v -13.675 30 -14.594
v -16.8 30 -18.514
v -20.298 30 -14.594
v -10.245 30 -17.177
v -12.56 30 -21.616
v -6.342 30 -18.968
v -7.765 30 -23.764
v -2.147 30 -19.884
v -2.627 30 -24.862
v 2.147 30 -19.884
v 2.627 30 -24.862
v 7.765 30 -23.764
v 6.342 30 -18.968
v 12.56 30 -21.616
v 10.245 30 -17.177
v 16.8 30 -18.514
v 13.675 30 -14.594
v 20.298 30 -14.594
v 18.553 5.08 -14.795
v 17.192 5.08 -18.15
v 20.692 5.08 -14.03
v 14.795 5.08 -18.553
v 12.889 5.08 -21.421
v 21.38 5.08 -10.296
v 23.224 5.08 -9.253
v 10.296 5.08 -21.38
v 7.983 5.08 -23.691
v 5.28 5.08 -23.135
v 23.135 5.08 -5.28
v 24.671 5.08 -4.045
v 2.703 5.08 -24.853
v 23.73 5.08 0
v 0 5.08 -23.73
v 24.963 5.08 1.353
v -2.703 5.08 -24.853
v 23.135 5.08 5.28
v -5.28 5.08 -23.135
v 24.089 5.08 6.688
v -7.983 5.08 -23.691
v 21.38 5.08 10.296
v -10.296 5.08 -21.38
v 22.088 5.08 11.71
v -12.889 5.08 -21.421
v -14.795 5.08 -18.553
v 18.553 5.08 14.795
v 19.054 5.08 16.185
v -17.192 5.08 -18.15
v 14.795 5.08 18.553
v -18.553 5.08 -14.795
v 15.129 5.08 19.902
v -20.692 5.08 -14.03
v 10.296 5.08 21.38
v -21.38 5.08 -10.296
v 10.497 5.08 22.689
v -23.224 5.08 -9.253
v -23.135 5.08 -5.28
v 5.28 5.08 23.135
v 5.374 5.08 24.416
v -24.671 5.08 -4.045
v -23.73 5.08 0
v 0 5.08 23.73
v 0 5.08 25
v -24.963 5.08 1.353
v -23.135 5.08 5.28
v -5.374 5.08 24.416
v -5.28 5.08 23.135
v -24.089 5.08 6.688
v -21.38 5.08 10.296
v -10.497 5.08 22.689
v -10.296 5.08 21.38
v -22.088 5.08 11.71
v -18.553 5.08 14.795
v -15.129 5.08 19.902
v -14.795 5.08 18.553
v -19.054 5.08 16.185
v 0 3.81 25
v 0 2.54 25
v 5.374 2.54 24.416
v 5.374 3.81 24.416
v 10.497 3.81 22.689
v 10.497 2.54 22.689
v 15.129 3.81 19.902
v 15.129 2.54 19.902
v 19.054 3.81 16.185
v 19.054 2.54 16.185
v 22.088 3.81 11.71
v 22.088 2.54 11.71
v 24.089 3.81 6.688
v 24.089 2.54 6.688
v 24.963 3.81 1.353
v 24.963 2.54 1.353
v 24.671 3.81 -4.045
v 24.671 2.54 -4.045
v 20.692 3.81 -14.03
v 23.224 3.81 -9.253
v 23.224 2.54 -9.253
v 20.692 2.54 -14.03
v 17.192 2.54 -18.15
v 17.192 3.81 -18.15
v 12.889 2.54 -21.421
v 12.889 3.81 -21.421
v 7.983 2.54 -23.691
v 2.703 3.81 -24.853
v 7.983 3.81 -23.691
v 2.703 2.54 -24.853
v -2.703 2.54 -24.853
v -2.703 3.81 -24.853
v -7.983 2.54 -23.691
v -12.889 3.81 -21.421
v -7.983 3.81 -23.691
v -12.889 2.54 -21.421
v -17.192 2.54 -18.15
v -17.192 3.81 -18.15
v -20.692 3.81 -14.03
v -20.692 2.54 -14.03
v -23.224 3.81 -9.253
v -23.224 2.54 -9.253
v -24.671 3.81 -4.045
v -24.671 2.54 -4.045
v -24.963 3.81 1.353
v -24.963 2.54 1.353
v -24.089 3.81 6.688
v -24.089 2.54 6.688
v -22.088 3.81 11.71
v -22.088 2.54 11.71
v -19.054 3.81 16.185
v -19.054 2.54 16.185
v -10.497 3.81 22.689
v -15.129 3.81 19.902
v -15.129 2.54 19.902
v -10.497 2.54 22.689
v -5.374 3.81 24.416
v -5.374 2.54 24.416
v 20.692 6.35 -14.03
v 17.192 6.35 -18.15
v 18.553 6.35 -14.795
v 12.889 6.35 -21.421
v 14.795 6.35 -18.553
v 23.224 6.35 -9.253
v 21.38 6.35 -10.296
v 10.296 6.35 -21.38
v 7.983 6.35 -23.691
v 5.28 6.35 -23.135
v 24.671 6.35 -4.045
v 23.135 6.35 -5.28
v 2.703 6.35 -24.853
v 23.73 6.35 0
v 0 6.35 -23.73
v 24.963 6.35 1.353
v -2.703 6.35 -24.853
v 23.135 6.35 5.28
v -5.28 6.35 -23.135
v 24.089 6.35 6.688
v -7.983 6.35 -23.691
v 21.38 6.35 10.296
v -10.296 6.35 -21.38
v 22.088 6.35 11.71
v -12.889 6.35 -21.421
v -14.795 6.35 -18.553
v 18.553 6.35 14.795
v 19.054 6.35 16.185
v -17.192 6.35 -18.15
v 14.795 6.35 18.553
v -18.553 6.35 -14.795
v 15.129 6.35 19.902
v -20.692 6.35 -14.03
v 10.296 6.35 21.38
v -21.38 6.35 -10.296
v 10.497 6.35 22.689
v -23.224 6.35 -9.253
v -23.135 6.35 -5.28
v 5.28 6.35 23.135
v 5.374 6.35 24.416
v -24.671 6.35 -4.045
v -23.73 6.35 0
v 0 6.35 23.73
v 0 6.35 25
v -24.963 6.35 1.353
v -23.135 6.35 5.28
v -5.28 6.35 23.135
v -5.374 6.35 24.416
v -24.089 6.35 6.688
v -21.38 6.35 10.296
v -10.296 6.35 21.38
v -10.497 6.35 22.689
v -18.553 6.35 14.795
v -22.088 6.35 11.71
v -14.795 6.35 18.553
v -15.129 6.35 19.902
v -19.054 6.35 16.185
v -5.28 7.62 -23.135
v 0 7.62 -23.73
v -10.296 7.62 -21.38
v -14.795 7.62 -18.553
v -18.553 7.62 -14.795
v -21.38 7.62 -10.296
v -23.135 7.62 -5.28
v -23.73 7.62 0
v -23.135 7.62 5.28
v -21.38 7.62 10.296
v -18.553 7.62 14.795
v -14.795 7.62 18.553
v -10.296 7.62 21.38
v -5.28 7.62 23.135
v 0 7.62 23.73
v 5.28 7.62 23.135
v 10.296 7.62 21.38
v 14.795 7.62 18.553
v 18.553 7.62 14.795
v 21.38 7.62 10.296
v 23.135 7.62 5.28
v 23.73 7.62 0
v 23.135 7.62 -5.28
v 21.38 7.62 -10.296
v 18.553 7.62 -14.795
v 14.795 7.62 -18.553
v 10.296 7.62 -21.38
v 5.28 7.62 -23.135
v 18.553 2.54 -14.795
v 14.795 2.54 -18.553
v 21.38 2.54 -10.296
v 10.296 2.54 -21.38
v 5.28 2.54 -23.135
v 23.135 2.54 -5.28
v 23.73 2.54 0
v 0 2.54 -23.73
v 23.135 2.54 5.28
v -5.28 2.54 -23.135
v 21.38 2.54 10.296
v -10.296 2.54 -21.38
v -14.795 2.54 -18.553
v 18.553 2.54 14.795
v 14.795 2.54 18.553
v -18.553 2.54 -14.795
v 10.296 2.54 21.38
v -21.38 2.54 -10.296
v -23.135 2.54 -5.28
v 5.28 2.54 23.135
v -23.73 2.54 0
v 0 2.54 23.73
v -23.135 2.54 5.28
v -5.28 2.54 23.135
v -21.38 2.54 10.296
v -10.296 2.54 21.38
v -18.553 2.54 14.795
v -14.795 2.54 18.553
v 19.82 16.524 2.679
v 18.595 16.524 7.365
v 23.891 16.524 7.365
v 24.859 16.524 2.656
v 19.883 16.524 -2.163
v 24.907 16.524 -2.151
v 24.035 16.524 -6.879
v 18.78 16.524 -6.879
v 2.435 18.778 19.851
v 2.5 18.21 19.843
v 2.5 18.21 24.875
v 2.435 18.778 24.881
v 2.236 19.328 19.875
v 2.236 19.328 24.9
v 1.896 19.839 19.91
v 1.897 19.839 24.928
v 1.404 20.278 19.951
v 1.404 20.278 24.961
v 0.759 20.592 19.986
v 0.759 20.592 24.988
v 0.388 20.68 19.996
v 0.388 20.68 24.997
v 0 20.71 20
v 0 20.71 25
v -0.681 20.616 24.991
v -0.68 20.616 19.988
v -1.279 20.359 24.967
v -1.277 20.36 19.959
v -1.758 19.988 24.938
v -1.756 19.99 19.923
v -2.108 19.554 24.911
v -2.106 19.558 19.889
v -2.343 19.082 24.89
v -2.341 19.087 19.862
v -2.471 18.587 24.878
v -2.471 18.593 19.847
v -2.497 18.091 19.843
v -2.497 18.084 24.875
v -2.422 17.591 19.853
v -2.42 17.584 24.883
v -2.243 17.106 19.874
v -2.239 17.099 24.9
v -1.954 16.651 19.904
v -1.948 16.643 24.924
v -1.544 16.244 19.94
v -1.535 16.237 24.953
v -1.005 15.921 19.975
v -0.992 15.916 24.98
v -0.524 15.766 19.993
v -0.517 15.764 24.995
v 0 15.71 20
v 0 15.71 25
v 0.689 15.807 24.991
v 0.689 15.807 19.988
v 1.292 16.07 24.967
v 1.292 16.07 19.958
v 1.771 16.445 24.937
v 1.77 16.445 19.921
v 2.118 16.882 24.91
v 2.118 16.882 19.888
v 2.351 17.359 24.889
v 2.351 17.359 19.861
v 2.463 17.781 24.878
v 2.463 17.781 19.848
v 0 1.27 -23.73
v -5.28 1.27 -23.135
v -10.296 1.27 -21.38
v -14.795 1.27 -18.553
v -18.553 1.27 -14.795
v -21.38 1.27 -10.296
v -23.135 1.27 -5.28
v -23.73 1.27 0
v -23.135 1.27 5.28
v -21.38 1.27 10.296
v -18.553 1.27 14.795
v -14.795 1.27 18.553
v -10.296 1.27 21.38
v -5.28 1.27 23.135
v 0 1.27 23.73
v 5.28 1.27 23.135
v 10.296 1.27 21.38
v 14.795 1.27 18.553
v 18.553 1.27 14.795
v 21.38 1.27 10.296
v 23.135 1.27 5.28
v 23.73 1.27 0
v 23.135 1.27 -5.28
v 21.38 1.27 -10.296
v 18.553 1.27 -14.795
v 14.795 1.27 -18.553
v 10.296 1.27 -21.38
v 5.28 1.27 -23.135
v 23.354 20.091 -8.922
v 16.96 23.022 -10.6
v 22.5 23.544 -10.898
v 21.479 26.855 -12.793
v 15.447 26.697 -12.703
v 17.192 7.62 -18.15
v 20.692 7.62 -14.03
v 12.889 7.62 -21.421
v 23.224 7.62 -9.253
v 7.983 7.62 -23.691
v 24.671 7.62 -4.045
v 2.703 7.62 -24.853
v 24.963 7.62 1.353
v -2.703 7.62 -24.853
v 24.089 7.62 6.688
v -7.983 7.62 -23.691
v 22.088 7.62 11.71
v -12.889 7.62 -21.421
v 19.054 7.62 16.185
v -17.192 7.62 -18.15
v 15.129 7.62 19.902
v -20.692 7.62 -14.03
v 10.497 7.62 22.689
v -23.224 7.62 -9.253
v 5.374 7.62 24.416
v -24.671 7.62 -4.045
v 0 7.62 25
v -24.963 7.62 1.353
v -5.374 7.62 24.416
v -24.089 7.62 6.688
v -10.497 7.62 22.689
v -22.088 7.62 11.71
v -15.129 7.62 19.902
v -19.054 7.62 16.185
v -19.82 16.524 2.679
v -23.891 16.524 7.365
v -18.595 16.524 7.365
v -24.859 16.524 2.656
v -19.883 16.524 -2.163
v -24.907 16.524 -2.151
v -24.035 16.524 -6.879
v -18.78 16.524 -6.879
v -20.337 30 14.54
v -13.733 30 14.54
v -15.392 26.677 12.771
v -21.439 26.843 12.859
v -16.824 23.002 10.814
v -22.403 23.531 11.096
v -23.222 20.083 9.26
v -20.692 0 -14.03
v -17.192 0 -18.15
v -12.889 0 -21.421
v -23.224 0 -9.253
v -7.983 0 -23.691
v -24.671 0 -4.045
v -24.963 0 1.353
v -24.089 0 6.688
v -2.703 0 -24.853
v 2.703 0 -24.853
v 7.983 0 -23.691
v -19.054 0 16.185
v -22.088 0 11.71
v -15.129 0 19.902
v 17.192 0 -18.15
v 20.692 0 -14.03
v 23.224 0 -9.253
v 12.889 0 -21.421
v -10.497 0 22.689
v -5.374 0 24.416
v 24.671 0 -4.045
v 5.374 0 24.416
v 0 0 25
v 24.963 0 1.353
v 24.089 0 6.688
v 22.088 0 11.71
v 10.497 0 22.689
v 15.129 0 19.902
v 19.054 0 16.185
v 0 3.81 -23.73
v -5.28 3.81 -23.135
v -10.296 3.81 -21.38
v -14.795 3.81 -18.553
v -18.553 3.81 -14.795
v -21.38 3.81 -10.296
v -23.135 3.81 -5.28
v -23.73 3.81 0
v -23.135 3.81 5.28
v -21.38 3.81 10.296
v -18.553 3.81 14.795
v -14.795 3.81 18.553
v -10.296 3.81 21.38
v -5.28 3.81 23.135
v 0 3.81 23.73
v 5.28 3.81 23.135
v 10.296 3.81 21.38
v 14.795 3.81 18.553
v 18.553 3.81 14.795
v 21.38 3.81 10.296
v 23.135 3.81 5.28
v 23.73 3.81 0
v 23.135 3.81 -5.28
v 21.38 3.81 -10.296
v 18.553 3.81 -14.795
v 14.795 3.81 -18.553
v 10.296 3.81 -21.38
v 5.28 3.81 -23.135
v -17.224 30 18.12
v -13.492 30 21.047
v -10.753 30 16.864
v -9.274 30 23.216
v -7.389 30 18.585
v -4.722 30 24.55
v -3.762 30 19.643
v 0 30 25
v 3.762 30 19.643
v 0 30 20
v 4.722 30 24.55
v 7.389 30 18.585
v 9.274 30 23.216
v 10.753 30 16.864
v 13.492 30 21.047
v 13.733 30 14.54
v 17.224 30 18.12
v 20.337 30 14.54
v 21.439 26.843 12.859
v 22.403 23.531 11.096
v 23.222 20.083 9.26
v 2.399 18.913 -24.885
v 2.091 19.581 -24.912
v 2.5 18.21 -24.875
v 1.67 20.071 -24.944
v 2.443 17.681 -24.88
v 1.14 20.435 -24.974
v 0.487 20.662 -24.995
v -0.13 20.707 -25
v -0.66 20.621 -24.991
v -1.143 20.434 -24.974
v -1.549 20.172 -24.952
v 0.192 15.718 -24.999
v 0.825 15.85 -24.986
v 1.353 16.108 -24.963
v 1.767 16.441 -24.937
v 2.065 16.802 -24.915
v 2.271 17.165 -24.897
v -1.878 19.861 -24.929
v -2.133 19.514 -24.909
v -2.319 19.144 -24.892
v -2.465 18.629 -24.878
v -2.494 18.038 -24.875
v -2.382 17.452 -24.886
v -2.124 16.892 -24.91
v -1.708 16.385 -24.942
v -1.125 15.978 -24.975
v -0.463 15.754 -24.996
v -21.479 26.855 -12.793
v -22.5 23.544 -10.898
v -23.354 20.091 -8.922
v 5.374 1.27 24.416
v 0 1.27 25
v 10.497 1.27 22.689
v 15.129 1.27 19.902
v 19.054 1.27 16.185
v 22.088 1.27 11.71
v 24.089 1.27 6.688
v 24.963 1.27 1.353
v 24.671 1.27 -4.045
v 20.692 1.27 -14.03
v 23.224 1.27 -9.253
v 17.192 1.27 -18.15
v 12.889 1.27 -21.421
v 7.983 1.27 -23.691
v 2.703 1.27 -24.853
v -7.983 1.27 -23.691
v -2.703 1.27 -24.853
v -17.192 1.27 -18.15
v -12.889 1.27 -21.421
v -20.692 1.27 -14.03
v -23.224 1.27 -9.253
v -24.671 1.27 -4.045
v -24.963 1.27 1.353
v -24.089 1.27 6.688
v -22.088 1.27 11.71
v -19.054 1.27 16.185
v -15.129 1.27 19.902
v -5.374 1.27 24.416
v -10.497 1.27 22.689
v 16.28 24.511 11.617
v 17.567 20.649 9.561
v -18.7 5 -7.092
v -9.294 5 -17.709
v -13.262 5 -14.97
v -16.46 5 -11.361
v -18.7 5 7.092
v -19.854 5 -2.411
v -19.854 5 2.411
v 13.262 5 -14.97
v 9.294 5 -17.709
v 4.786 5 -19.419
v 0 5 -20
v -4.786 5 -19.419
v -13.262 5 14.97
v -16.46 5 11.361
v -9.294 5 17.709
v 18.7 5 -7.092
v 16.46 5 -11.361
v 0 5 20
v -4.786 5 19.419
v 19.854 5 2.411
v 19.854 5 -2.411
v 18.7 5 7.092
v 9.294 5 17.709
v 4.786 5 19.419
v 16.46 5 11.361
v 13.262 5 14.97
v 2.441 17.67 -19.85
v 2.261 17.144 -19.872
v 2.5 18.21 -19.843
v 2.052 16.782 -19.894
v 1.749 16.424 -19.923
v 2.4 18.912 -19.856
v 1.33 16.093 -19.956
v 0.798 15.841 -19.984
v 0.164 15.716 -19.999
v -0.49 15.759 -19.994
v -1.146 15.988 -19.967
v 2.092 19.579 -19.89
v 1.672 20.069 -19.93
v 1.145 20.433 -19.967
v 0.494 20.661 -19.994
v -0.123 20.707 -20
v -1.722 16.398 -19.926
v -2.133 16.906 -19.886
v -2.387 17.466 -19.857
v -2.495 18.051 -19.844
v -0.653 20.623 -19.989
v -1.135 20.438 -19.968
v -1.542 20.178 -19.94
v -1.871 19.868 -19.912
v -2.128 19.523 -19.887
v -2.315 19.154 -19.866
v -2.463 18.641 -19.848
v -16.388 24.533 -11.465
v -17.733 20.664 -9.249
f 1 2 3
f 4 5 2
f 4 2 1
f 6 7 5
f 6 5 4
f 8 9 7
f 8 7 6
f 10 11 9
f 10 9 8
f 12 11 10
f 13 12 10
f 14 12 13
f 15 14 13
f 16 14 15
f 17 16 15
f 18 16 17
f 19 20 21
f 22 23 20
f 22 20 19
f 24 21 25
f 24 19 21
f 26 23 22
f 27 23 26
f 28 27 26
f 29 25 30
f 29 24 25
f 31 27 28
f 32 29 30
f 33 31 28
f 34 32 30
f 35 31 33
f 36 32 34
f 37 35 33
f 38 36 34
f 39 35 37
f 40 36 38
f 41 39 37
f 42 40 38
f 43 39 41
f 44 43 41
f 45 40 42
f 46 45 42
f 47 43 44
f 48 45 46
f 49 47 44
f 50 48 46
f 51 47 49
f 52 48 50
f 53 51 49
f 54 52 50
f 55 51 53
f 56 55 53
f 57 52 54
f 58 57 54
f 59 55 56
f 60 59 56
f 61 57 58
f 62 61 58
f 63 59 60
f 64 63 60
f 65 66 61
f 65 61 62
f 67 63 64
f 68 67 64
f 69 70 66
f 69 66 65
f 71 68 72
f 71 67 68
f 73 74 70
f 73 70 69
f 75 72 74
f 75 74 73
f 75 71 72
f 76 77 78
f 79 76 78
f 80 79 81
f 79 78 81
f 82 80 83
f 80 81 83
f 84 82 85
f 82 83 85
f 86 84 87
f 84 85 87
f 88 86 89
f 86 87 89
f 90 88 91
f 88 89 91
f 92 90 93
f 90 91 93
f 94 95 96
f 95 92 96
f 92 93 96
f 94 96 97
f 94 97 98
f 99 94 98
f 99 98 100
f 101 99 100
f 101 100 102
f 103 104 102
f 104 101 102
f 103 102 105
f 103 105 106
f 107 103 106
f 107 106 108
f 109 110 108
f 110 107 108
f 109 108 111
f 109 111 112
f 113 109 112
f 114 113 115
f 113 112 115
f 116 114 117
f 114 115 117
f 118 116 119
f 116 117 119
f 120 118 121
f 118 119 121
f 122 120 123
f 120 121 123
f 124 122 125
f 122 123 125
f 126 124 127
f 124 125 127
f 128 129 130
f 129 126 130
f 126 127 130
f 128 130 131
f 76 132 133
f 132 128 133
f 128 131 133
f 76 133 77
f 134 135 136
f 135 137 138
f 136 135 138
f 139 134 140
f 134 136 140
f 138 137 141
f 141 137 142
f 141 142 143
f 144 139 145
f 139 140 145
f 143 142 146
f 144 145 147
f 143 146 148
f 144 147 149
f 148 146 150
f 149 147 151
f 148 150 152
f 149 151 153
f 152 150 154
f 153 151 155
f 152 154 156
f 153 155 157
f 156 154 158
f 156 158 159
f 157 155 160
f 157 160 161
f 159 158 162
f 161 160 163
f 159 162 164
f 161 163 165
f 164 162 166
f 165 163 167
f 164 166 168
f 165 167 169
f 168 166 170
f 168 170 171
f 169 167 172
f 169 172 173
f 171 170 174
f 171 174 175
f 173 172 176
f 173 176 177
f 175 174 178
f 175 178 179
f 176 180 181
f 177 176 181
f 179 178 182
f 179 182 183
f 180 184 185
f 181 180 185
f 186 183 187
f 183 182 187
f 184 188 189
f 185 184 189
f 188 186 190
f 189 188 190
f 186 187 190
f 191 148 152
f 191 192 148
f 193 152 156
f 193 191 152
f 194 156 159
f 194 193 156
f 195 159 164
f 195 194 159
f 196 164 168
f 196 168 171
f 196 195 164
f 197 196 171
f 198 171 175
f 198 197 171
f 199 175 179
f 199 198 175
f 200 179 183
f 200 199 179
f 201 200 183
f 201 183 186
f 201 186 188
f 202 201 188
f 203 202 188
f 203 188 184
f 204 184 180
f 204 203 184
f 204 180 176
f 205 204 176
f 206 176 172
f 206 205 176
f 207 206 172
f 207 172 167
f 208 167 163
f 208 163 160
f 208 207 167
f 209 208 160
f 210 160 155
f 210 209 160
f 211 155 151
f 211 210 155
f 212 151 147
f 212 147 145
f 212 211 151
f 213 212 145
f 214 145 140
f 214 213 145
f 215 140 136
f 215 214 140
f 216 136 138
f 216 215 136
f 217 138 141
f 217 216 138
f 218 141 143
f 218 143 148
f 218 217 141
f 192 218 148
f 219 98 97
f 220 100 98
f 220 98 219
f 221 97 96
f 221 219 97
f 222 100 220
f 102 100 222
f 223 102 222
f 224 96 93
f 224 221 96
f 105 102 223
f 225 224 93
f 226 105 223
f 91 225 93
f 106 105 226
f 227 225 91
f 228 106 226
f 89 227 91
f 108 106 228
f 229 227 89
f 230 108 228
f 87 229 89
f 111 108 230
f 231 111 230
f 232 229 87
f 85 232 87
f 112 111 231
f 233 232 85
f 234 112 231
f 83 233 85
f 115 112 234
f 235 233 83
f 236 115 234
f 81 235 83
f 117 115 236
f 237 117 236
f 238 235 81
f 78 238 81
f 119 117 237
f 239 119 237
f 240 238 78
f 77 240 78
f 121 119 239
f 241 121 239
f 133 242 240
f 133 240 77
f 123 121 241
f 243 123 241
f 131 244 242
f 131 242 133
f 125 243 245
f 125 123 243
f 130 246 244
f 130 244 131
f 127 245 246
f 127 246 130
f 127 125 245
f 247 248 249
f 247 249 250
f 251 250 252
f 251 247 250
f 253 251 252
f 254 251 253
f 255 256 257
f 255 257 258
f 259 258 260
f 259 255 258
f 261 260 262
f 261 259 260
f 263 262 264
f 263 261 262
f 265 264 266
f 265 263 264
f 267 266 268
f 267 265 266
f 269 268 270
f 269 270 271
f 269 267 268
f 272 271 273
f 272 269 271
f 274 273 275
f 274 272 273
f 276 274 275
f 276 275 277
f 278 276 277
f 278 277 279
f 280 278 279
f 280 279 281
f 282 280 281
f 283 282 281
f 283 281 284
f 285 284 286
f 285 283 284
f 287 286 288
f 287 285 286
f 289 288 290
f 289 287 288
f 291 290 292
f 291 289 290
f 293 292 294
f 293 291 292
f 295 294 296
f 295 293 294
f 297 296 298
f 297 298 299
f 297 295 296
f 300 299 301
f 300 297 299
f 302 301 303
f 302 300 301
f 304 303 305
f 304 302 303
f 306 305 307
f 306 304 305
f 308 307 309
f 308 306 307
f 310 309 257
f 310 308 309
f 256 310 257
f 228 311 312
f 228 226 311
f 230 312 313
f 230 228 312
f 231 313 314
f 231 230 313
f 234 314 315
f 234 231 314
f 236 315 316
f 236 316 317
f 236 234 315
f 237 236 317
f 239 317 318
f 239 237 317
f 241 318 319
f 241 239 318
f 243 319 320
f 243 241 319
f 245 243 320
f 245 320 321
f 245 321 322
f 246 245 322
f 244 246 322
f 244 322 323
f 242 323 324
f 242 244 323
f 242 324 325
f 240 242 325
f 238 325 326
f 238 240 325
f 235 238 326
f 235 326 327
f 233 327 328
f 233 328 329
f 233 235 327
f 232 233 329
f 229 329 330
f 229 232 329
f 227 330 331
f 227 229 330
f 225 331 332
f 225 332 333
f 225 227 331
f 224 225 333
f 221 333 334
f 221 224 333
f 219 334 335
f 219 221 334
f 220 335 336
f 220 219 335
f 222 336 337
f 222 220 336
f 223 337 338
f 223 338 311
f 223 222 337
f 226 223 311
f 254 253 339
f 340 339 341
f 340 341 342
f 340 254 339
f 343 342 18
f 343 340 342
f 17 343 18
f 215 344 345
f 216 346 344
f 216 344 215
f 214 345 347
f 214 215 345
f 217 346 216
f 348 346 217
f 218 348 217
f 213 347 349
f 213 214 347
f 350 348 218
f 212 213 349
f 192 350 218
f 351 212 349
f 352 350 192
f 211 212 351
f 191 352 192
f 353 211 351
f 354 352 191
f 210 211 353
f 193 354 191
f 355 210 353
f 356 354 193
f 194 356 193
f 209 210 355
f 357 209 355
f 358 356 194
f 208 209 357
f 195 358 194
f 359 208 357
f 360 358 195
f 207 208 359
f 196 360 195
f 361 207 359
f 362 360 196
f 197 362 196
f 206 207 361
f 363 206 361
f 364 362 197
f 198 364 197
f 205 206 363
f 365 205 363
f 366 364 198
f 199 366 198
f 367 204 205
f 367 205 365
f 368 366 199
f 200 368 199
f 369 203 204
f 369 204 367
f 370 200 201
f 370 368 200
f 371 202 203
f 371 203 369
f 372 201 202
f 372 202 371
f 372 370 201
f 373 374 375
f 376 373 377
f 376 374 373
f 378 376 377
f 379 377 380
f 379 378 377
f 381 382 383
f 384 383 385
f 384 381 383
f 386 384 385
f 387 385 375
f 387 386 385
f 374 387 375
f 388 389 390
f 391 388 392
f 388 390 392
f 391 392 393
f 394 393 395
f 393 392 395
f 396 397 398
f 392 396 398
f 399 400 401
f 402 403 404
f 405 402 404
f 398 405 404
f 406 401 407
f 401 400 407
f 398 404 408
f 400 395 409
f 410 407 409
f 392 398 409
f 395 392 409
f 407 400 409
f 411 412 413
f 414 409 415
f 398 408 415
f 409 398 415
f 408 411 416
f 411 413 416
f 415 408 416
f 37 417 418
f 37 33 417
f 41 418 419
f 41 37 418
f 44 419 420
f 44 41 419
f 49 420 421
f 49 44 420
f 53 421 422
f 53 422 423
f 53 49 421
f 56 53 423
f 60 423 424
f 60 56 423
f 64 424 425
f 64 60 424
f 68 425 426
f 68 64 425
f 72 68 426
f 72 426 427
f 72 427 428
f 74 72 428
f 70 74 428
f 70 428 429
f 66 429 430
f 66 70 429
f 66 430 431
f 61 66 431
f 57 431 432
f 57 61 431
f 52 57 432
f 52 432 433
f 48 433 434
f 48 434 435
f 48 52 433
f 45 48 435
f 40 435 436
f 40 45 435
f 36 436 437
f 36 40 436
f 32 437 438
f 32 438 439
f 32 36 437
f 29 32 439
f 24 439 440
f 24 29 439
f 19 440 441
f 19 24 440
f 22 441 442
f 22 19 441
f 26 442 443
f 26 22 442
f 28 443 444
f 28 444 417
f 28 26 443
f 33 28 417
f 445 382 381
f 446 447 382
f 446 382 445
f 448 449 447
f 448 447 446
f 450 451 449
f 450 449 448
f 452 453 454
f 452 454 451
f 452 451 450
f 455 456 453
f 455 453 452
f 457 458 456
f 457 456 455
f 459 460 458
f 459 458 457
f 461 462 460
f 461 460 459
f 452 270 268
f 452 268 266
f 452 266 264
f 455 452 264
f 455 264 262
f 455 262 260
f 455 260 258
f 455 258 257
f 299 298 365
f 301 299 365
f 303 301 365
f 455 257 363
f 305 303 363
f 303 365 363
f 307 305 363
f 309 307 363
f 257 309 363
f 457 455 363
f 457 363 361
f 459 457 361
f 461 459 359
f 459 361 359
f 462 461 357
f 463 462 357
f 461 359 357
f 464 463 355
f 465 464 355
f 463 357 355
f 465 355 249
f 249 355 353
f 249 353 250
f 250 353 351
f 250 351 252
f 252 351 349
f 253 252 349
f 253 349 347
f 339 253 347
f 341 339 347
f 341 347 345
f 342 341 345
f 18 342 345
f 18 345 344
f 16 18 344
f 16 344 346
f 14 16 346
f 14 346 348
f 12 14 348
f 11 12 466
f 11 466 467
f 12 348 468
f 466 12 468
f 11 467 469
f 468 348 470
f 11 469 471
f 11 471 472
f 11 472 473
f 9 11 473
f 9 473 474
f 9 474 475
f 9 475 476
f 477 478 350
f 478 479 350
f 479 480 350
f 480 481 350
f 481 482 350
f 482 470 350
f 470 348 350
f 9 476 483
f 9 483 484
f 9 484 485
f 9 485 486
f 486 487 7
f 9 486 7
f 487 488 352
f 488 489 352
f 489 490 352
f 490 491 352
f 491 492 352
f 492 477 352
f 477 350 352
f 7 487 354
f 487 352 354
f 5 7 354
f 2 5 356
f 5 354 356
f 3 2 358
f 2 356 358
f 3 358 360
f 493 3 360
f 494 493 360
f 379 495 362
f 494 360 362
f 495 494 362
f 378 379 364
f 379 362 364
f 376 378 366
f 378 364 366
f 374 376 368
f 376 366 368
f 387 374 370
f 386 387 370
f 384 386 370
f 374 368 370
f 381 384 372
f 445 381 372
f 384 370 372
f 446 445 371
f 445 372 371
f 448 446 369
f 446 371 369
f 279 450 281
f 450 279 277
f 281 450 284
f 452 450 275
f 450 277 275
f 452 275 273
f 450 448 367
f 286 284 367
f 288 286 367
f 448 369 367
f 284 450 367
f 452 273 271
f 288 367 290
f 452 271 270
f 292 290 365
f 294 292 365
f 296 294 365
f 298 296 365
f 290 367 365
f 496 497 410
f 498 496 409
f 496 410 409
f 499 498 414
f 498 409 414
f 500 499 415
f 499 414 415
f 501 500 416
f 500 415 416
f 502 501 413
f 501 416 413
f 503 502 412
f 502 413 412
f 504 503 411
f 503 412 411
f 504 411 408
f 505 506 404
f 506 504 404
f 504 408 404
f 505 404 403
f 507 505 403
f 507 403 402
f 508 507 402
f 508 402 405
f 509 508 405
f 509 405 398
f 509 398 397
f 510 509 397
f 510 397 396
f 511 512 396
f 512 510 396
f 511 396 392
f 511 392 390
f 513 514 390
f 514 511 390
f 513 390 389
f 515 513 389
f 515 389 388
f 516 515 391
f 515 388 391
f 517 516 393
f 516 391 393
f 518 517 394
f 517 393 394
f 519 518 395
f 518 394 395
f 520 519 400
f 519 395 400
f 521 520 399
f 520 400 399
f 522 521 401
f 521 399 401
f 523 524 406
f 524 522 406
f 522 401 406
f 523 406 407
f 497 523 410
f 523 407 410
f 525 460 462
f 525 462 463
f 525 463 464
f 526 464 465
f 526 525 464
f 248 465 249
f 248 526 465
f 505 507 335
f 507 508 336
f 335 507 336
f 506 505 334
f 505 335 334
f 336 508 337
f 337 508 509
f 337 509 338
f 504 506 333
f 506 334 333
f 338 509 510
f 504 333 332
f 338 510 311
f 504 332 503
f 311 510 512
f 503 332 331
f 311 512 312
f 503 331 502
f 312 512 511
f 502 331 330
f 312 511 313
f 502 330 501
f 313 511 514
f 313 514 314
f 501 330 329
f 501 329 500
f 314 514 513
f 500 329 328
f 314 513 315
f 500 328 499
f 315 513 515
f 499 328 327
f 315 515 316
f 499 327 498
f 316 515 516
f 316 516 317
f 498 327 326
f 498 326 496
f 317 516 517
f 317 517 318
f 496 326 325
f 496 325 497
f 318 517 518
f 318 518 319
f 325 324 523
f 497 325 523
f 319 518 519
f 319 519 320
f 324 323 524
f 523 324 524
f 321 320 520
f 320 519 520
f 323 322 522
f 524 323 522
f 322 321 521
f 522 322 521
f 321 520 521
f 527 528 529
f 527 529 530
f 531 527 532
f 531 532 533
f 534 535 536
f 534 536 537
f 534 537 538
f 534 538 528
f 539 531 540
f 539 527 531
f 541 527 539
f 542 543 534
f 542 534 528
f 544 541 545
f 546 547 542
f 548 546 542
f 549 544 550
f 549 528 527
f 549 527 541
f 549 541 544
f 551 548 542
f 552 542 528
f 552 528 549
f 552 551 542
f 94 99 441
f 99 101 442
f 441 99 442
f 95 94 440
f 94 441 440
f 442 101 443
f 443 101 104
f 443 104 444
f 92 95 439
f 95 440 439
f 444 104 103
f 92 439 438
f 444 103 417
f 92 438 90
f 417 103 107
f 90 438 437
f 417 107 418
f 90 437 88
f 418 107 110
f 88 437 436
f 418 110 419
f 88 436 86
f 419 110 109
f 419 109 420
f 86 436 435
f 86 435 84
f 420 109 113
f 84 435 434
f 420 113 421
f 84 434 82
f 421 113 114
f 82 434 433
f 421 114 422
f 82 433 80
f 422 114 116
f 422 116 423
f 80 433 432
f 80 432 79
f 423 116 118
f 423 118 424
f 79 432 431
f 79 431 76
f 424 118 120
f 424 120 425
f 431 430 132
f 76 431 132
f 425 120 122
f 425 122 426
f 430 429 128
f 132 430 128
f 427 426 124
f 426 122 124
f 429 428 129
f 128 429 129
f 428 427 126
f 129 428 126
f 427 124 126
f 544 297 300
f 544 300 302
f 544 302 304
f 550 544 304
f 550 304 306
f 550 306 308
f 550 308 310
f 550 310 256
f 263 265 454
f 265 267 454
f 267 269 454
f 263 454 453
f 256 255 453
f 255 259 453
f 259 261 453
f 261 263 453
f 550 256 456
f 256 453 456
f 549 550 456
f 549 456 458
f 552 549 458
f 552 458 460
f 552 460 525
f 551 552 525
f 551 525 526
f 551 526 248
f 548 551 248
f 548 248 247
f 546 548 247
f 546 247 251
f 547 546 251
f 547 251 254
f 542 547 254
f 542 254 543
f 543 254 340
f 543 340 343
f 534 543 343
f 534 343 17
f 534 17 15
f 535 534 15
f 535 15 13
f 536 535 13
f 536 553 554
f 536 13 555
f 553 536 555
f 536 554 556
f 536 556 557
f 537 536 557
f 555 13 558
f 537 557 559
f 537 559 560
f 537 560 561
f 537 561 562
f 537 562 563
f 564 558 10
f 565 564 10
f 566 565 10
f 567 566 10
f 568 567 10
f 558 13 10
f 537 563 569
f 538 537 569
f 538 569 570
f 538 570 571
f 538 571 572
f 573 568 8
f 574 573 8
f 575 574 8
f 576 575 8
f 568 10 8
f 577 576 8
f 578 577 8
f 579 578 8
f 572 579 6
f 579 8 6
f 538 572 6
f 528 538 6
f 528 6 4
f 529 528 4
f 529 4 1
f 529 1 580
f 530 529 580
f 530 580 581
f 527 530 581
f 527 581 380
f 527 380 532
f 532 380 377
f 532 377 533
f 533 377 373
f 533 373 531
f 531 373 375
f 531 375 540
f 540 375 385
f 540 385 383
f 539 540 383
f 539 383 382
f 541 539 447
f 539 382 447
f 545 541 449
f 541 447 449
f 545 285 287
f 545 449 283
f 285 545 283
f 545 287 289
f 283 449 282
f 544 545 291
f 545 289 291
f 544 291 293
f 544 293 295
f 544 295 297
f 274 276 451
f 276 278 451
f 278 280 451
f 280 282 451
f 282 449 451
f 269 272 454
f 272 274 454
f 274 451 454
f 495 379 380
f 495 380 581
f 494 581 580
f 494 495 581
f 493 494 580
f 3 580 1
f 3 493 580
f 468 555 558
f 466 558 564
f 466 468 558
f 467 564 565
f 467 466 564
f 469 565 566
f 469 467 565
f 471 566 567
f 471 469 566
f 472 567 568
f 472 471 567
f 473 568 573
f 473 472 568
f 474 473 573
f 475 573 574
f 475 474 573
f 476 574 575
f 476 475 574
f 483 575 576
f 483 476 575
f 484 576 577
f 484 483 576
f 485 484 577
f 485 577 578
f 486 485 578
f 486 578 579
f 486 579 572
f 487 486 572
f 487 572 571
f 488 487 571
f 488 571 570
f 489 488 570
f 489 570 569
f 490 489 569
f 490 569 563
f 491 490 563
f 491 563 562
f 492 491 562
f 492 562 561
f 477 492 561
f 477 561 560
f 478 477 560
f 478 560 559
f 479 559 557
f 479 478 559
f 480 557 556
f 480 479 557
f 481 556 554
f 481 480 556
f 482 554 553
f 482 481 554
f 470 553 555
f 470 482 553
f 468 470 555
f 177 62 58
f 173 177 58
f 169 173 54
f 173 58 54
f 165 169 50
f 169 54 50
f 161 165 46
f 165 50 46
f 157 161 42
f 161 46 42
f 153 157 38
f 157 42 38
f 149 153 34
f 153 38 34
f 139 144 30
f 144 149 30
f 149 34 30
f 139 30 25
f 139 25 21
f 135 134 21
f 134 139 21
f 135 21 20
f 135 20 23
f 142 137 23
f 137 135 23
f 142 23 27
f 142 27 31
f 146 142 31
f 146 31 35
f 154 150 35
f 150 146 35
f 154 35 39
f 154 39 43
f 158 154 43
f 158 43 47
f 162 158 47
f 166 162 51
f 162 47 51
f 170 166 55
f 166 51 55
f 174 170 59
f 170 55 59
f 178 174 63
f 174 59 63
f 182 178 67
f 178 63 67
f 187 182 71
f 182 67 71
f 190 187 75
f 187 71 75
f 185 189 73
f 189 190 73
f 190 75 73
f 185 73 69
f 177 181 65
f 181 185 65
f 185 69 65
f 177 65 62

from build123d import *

# Parameters (mm, degrees)
SKETCH1_R               = 25
BOSS_EXTRUDE1_DEPTH     = 30
SKETCH2_W               = 1.27
SKETCH2_H               = 1.27
SKETCH10_R              = 20
CUT_EXTRUDE1_DEPTH      = 25
CUT_EXTRUDE2_DEPTH      = 47.368092477
CUT_EXTRUDE2_DEPTH_BACK = 47.368092477
CUT_EXTRUDE3_DEPTH      = 47.368092477
CUT_EXTRUDE3_DEPTH_BACK = 47.368092477
SKETCH12_R              = 2.5


with BuildPart() as part:
    # Sketch1 → Boss-Extrude1 (new body)
    with BuildSketch(Plane(origin=(0, 0, 0), x_dir=(1, 0, 0), z_dir=(0, 1, 0))):
        Circle(SKETCH1_R)
    extrude(amount=BOSS_EXTRUDE1_DEPTH)

    # Sketch2 → Cut-Revolve1 (revolve, cut)
    with BuildSketch(Plane.XY):
        with Locations((24.365, 1.905)):
            Rectangle(SKETCH2_W, SKETCH2_H)
        with Locations((24.365, 4.445)):
            Rectangle(SKETCH2_W, SKETCH2_H)
        with Locations((24.365, 6.985)):
            Rectangle(SKETCH2_W, SKETCH2_H)
    revolve(axis=Axis((0, 0, 0), (0, 1, 0)), mode=Mode.SUBTRACT)

    # Sketch10 → Cut-Extrude1 (cut)
    with BuildSketch(Plane(origin=(0, 30, 0), x_dir=(1, 0, 0), z_dir=(0, 1, 0))):
        Circle(SKETCH10_R)
    extrude(amount=-CUT_EXTRUDE1_DEPTH, mode=Mode.SUBTRACT)

    # Sketch11 → Cut-Extrude2 (cut, two sides: drawn at the far end of the back side and taken through both)
    with BuildSketch(Plane(origin=(0, 0, 0), x_dir=(0, 0, -1), z_dir=(1, 0, 0)).offset(-CUT_EXTRUDE2_DEPTH_BACK)):
        Polygon((0, 16.523537724), (6.878930104, 16.523537724), (14.594122298, 30), (-14.540169905, 30), (-7.36450164, 16.523537724), align=None)
    extrude(amount=CUT_EXTRUDE2_DEPTH + CUT_EXTRUDE2_DEPTH_BACK, mode=Mode.SUBTRACT)

    # Sketch12 → Cut-Extrude3 (cut, two sides: drawn at the far end of the back side and taken through both)
    with BuildSketch(Plane.XY.offset(-CUT_EXTRUDE3_DEPTH_BACK)):
        with Locations((0, 18.210167382)):
            Circle(SKETCH12_R)
    extrude(amount=CUT_EXTRUDE3_DEPTH + CUT_EXTRUDE3_DEPTH_BACK, mode=Mode.SUBTRACT)


solid = part.part
